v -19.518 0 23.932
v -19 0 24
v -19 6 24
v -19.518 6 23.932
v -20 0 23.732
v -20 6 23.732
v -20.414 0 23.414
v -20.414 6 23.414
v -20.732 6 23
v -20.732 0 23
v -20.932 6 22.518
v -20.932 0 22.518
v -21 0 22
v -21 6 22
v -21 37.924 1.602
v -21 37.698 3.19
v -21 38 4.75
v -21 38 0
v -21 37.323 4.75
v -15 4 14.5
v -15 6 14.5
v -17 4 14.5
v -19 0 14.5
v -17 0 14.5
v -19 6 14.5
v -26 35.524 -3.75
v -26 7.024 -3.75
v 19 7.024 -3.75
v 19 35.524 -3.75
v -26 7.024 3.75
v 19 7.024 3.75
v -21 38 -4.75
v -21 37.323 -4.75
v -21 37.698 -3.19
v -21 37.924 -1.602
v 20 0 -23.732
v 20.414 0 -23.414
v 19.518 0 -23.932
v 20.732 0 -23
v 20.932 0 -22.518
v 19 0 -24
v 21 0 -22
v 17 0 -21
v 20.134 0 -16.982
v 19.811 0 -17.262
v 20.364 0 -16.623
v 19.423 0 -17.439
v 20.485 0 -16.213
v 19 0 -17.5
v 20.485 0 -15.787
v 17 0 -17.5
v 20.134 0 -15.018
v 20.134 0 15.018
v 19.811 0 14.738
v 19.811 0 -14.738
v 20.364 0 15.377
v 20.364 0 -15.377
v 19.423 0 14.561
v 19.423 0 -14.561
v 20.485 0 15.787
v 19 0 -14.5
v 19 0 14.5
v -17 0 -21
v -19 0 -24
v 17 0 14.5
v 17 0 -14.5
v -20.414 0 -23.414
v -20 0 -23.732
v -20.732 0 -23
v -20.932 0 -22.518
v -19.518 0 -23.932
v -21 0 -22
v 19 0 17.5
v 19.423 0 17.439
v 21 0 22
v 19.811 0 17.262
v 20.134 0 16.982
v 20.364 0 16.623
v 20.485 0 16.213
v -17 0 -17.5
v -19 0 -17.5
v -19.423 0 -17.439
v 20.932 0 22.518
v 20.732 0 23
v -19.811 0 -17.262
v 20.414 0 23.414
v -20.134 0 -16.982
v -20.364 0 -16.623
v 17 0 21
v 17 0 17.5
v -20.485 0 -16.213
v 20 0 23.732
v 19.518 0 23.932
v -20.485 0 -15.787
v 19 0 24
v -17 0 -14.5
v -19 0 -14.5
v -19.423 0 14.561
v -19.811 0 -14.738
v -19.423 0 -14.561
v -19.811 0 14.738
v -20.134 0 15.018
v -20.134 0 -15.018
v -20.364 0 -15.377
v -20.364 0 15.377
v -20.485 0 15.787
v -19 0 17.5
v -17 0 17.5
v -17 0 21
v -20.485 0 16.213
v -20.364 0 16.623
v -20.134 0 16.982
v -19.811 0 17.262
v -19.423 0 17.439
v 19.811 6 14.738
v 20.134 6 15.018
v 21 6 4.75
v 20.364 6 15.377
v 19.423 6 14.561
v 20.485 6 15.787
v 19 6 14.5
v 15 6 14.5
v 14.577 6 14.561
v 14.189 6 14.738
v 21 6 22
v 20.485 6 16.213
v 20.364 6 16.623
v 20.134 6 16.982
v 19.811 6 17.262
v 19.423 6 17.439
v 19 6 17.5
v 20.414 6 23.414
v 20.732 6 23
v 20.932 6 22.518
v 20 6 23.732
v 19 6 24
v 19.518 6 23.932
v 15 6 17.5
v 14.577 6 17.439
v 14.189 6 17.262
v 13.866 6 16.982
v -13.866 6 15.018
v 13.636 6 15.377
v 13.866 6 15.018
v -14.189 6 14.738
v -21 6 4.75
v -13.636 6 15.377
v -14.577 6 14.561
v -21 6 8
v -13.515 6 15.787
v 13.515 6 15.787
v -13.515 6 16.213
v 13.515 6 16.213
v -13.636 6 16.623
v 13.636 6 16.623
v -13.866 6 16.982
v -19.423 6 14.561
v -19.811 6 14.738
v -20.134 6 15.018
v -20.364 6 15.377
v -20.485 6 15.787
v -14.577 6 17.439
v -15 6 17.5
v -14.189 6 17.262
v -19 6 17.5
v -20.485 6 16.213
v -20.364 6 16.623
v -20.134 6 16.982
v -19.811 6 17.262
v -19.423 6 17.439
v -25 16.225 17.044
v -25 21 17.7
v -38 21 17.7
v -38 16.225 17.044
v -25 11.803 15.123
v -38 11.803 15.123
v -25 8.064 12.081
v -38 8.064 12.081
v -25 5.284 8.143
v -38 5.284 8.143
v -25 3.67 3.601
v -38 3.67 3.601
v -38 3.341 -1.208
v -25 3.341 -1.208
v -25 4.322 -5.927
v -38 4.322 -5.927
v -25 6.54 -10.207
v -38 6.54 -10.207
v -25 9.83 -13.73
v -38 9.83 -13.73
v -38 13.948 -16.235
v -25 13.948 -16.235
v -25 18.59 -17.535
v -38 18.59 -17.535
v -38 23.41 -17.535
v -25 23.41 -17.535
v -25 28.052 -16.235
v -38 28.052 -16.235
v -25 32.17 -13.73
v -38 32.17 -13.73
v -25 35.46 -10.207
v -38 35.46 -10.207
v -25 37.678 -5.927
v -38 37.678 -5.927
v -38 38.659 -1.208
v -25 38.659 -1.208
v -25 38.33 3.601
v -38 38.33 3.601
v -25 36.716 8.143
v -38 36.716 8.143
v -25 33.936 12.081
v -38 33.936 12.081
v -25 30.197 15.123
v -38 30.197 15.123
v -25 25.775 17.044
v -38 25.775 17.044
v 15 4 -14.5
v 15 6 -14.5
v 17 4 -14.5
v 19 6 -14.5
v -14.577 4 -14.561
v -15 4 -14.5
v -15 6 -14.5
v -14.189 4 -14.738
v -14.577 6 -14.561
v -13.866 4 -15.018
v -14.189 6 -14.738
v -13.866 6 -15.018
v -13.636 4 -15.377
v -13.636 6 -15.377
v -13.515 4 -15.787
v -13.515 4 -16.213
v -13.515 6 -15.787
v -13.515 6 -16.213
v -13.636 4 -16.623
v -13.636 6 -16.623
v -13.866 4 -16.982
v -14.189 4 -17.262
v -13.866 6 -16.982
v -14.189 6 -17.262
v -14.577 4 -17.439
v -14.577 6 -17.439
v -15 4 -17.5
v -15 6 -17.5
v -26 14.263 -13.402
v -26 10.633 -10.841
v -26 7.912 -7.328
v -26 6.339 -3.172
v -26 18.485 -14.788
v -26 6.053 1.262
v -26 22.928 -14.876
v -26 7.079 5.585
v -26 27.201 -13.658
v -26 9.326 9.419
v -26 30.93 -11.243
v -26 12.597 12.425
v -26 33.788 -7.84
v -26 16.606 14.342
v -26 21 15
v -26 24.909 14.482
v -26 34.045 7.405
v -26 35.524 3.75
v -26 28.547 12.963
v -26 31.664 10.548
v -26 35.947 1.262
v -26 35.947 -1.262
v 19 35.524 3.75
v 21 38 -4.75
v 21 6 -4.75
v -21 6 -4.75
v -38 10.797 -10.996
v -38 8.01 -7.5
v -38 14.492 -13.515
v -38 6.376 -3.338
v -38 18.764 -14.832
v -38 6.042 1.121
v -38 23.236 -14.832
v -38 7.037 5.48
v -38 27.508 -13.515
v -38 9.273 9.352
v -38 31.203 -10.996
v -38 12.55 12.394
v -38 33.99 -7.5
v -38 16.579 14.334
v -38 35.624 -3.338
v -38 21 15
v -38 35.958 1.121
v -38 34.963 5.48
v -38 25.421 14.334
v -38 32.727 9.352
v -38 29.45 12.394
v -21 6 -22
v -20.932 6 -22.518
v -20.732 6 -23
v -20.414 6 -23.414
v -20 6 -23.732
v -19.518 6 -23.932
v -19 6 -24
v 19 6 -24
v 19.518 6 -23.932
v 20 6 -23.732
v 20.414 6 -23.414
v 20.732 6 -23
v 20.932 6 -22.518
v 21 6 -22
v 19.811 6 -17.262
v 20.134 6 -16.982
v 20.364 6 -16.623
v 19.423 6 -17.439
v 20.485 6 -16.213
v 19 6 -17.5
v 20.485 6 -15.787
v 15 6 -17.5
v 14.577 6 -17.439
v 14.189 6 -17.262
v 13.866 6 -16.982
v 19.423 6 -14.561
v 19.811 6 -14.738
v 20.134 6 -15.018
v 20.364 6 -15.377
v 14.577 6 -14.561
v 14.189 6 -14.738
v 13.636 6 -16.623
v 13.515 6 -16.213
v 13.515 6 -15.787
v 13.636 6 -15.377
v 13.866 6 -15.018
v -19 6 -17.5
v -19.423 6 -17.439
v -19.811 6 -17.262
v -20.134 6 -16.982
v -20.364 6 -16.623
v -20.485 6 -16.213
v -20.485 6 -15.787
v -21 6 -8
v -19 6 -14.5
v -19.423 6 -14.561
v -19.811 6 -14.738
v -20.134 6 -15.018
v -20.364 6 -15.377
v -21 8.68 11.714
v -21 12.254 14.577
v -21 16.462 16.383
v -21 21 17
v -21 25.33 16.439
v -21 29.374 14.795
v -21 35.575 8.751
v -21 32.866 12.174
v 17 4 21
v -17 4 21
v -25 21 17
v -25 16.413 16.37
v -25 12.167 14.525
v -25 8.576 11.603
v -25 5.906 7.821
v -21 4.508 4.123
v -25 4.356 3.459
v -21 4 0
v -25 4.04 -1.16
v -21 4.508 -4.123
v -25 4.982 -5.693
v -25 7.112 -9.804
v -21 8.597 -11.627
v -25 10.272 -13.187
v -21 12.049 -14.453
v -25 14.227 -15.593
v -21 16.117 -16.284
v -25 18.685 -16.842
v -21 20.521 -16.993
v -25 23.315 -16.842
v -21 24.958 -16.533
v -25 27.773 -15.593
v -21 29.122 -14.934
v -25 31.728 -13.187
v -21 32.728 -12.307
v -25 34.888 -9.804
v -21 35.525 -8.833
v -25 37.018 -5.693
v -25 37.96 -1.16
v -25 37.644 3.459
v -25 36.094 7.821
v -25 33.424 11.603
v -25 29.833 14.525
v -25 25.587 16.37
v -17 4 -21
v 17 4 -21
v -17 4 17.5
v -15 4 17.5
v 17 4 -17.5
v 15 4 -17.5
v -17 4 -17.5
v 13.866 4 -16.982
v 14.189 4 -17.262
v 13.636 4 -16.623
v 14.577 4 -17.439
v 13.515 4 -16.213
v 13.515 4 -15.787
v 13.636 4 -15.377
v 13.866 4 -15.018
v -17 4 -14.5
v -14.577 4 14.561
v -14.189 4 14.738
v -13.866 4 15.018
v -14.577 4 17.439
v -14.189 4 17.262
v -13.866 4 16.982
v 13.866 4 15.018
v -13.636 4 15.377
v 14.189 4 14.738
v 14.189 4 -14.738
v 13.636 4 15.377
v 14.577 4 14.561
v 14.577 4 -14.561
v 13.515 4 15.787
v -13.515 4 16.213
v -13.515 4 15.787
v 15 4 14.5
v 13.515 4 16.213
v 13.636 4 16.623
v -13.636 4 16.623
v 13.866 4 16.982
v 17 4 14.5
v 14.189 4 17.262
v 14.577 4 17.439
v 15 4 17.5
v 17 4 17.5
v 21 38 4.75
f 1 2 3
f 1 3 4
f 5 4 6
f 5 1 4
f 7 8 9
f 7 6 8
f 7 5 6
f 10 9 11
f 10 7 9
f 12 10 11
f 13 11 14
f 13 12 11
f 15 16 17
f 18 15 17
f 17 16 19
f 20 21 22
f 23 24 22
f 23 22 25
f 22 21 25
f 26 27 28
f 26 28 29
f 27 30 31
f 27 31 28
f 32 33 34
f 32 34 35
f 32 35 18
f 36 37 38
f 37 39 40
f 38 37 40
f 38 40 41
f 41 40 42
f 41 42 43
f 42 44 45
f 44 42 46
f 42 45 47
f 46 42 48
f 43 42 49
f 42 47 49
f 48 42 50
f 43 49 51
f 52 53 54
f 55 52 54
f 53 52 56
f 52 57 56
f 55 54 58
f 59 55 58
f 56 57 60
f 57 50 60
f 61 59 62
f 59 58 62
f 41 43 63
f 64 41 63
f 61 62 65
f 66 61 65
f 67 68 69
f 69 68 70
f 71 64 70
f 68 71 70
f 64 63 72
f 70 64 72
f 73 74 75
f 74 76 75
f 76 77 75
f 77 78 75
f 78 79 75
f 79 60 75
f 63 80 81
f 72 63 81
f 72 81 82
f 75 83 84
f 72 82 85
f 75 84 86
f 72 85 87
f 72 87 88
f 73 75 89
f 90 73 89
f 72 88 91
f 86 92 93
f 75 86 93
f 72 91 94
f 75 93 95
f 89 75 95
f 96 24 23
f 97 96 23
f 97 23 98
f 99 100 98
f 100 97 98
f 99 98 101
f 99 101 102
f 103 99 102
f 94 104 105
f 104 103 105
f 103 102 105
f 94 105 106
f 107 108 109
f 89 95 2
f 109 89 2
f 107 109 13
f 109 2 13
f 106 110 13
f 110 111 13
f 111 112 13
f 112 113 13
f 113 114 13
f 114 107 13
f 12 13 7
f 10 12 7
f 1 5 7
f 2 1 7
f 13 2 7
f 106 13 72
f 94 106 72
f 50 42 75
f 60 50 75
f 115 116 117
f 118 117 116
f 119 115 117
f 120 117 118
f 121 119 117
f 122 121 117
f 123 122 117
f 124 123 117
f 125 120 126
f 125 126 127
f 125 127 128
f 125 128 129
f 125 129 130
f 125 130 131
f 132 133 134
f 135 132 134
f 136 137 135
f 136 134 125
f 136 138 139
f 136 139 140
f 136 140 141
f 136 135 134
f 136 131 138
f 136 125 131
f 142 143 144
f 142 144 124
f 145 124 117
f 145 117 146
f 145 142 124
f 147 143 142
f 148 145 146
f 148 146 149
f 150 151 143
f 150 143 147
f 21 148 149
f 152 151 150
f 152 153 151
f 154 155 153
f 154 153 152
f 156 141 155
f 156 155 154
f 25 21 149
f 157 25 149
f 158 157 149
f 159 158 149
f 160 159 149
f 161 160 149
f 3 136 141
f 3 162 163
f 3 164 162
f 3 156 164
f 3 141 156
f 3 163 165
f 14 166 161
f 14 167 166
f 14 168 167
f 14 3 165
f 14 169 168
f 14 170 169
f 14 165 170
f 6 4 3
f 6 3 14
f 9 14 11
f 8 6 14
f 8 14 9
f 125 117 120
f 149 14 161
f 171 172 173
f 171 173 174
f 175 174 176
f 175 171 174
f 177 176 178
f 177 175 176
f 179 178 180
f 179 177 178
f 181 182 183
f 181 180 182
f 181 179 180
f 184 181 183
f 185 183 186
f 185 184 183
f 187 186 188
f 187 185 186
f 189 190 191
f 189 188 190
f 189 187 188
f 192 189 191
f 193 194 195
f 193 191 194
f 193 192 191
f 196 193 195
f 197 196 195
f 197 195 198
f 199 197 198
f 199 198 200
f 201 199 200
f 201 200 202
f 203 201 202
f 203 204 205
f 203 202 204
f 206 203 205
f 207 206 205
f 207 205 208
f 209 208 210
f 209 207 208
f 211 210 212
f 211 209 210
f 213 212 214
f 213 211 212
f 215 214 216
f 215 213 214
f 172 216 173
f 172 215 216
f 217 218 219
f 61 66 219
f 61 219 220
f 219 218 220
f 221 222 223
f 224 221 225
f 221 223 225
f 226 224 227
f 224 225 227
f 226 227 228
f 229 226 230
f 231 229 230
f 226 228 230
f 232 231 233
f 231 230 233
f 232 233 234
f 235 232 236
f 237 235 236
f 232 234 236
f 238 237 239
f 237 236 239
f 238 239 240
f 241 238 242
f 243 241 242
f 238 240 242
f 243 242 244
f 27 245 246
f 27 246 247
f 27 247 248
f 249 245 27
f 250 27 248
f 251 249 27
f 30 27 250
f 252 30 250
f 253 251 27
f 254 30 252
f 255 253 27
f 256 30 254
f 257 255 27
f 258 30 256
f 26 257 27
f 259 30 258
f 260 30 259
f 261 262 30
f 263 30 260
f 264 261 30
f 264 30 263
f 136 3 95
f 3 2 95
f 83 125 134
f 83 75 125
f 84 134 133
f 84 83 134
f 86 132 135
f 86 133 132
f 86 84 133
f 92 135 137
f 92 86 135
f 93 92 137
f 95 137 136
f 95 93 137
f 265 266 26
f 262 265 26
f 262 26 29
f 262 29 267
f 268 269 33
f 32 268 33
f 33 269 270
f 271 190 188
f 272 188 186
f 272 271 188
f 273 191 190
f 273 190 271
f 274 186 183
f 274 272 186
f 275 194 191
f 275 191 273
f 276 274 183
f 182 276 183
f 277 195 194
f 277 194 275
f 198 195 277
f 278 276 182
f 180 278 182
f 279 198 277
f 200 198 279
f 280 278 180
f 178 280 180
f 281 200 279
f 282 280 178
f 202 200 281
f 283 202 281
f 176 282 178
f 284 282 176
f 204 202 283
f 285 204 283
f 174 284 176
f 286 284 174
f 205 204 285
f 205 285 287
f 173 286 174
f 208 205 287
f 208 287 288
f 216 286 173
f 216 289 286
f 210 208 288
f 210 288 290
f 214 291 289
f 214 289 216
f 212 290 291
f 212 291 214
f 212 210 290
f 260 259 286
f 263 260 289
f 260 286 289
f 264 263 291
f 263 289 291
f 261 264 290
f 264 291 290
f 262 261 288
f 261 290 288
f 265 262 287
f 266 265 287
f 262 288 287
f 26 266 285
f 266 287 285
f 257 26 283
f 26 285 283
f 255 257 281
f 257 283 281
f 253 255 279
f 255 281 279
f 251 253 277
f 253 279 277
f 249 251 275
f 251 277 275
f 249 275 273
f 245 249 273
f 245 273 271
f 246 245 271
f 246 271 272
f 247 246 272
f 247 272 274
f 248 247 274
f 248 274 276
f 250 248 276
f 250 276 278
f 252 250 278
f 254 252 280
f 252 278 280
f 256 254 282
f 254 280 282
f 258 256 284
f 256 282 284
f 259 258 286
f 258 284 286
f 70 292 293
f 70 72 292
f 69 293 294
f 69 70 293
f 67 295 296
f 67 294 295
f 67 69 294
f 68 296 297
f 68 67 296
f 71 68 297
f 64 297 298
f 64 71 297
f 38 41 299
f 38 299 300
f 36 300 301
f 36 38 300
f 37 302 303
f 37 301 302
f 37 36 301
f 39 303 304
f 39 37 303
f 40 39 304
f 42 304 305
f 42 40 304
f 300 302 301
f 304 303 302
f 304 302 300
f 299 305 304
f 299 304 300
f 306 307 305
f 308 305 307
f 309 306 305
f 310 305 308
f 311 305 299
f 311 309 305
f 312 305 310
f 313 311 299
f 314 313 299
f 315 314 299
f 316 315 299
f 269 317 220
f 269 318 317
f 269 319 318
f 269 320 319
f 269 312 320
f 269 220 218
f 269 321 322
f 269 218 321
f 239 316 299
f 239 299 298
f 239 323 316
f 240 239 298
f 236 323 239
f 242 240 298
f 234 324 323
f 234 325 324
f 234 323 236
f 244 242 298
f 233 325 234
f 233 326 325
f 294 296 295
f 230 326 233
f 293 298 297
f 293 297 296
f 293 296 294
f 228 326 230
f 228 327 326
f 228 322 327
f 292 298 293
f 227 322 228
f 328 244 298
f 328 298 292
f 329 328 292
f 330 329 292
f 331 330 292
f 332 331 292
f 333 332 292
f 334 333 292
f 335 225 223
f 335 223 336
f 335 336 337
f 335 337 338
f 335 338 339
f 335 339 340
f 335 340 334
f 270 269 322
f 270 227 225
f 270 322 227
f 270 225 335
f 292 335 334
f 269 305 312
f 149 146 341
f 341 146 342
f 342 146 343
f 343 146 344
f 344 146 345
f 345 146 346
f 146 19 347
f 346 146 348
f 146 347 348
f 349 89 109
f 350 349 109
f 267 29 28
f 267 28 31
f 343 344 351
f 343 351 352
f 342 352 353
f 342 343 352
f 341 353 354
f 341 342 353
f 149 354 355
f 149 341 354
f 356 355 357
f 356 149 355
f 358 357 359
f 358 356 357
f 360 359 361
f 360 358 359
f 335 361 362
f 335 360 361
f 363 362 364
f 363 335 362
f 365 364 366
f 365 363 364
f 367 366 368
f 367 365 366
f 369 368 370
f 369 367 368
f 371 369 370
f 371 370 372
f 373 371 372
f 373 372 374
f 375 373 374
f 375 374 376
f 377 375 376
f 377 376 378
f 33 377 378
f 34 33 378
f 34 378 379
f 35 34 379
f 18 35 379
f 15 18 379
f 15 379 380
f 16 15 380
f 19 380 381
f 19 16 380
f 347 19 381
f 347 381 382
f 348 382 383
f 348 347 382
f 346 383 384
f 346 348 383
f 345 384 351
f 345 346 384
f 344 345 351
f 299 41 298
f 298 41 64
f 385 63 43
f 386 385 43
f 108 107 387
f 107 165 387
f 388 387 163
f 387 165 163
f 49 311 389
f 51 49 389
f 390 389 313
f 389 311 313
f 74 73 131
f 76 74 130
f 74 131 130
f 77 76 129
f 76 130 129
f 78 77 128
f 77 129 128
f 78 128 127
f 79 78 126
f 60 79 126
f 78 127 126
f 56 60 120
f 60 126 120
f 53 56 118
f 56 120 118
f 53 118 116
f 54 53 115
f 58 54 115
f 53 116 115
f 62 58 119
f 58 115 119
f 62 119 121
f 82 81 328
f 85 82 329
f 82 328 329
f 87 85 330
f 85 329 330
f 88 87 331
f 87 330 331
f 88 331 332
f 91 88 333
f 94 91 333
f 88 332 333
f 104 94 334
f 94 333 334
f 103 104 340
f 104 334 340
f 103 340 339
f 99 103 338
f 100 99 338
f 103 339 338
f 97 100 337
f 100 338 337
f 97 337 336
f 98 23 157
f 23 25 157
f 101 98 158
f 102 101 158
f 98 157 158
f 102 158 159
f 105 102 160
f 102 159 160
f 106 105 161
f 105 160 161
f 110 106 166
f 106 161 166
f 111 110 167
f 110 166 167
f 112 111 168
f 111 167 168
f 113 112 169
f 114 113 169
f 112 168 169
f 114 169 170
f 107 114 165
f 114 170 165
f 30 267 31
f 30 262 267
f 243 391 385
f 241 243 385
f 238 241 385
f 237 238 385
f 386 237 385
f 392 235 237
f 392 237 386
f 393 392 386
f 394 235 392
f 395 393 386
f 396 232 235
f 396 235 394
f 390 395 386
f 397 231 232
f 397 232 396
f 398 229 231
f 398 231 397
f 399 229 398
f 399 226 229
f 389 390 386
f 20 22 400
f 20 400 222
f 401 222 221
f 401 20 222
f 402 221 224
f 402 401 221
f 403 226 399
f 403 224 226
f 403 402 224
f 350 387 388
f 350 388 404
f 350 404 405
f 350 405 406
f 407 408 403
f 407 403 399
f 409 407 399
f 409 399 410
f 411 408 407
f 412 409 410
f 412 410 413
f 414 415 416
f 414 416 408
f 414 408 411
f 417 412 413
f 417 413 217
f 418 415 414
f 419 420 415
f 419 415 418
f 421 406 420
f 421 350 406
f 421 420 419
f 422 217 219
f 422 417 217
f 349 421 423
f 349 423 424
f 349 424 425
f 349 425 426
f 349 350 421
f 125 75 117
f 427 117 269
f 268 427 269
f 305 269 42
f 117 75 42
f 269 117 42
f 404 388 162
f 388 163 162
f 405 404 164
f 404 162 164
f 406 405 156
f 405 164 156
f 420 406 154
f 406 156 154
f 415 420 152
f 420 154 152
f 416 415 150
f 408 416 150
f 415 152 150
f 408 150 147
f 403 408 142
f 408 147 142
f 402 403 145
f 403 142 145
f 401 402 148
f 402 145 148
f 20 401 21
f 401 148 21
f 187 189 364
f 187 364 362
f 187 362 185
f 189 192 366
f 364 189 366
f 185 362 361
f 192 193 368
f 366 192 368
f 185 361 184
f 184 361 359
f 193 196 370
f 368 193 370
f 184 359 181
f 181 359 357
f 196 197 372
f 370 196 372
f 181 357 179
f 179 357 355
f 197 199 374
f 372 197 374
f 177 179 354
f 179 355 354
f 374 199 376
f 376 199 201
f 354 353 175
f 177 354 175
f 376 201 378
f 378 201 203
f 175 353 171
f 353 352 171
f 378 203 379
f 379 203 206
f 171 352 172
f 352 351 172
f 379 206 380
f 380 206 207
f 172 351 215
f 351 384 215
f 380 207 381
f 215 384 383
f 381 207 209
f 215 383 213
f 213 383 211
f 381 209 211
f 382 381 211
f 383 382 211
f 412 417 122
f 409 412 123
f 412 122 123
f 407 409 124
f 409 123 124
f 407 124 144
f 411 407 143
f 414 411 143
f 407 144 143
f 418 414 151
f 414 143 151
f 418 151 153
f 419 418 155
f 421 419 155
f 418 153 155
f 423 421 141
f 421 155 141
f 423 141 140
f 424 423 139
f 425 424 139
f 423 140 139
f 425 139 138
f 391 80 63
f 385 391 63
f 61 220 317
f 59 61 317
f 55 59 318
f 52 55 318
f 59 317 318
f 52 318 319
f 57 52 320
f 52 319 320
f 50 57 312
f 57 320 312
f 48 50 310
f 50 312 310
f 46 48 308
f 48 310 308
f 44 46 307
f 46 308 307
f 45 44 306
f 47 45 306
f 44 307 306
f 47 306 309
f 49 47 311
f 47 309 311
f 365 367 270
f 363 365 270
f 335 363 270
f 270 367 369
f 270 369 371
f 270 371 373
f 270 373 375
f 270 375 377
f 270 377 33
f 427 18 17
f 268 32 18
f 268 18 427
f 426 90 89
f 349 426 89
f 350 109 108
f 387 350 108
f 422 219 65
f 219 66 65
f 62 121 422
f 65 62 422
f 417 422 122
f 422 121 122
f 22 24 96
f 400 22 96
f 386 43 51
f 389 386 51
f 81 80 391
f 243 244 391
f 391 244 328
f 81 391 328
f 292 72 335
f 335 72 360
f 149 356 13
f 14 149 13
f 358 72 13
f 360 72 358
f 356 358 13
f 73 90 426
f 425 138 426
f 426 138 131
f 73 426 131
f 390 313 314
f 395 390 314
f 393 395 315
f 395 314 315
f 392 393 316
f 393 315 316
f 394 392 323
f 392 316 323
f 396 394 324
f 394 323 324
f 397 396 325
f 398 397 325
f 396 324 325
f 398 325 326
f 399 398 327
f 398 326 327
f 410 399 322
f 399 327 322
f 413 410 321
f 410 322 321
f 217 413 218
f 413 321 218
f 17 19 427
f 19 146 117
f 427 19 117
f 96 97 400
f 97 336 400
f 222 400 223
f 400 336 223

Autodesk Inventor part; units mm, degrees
ref_plane "YZ Plane" through (0, 0, 0) normal (1, 0, 0) x (0, 1, 0)
ref_plane "XZ Plane" through (0, 0, 0) normal (0, 1, 0) x (-1, 0, 0)
ref_plane "XY Plane" through (0, 0, 0) normal (0, 0, 1) x (1, 0, 0)
sketch "Sketch1" plane through (0, 0, 0) normal (0, 1, 0) x (-1, 0, 0)
  line L0 (29.9799, 0) -> (-29.9799, 0) projected
  line L1 (0, -34.1799) -> (0, 34.1799) projected
  line L2 (19, 24) -> (-19, 24)
  line L3 (-21, 22) -> (-21, -22)
  line L4 (-19, -24) -> (19, -24)
  line L5 (21, -22) -> (21, 22)
  arc A0 (21, 22) -> (19, 24) centre (19, 22) ccw
  arc A1 (19, -24) -> (21, -22) centre (19, -22) ccw
  arc A2 (-21, -22) -> (-19, -24) centre (-19, -22) ccw
  arc A3 (-19, 24) -> (-21, 22) centre (-19, 22) ccw
  point P0 (0, 0)
  point P1 (21, 24)
  point P2 (-21, -24)
  point P3 (-21, 24)
  point P4 (21, -24)
  dimension "d0" = 42
  dimension "d1" = 48
  dimension "d4" = 2
extrude "Extrusion1" add sketch "Sketch1" along normal blind 6
sketch "Sketch2" plane through (0, 0, 0) normal (0, -1, 0) x (1, 0, 0)
  line L0 (-29.4, 0) -> (29.4, 0) projected
  line L1 (0, -33.6) -> (0, 33.6) projected
  line L2 (17, 21) -> (-17, 21)
  line L3 (-17, 21) -> (-17, -21)
  line L4 (-17, -21) -> (17, -21)
  line L5 (17, -21) -> (17, 21)
  point P0 (0, 0)
  dimension "d5" = 34
  dimension "d6" = 42
extrude "Extrusion2" cut sketch "Sketch2" against normal blind 4
sketch "Sketch3" plane through (0, 6, 0) normal (0, 1, 0) x (1, 0, 0)
  line L0 (-29.4, 0) -> (29.4, 0) projected
  line L1 (0, 33.6) -> (0, -33.6) projected
  line L2 (19, 16) -> (15, 16) construction
  line L3 (17, -21) -> (17, 21) projected
  line L4 (19, 17.5) -> (15, 17.5)
  line L5 (15, 14.5) -> (19, 14.5)
  arc A0 (19, 14.5) -> (19, 17.5) centre (19, 16) ccw
  arc A1 (15, 17.5) -> (15, 14.5) centre (15, 16) ccw
  line L6 (19, 16) -> (23, 16) construction
  line L7 (21, -22) -> (21, 22) projected
  line L8 (19, 24) -> (-19, 24) projected
  point P0 (0, 0)
  point P1 (17, 16)
  dimension "d9" = 4
  dimension "d10" = 180
  dimension "d11" = 3
  dimension "d12" = 4
  dimension "d13" = 8
extrude "Extrusion3" cut sketch "Sketch3" against normal through all
mirror "Mirror1" about plane through (0, 0, 0) normal (0, 0, 1) of "Extrusion3"
mirror "Mirror2" about plane through (0, 0, 0) normal (1, 0, 0) of "Extrusion3", "Mirror1"
sketch "Sketch4" plane through (0, 6, 0) normal (0, 1, 0) x (1, 0, 0)
  line L0 (21, 4.75) -> (-21, 4.75)
  line L1 (-21, 4.75) -> (-21, -4.75)
  line L2 (-21, -4.75) -> (21, -4.75)
  line L3 (21, -4.75) -> (21, 4.75)
  line L4 (21, -22) -> (21, 22) projected
  line L5 (-21, 22) -> (-21, -22) projected
  line L6 (-29.4, 0) -> (29.4, 0) projected
  point P0 (0, 0)
  dimension "d16" = 9.5
extrude "Extrusion4" add sketch "Sketch4" along normal blind 32
sketch "Sketch5" plane through (-21, 0, -22) normal (-1, 0, 0) x (0, 0, 1)
  circle A0 centre (22, 21) radius 17
  line L0 (17.25, 38) -> (26.75, 38) projected
  line L1 (22, -7.6) -> (22, 45.6) projected
  point P0 (22, 0)
  dimension "d19" = 34
extrude "Extrusion5" add sketch "Sketch5" along normal blind 4
sketch "Sketch6" plane through (-25, 21, 0) normal (-1, 0, 0) x (0, 0, 1)
  circle A0 centre (0, 0) radius 17 projected
  circle A1 centre (0, 0) radius 17.7
  point P0 (0, -21)
  dimension "d22" = 35.4
extrude "Extrusion6" add sketch "Sketch6" along normal blind 13 contours A0 | A1
sketch "Sketch7" plane through (-38, 21, 0) normal (-1, 0, 0) x (0, 0, 1)
  circle A0 centre (0, 0) radius 17.7 projected
  circle A1 centre (0, 0) radius 15
  point P0 (0, -21)
  dimension "d25" = 30
extrude "Extrusion7" cut sketch "Sketch7" against normal blind 12 contours A1
sketch "Sketch8" plane through (-26, 21, 0) normal (-1, 0, 0) x (0, 0, 1)
  line L0 (-3.75, 14.5237) -> (3.75, 14.5237)
  line L1 (3.75, 14.5237) -> (3.75, -13.9763)
  line L2 (3.75, -13.9763) -> (-3.75, -13.9763)
  line L3 (-3.75, -13.9763) -> (-3.75, 14.5237)
  circle A0 centre (0, 0) radius 15 projected
  line L4 (0, -28.74) -> (0, 25.44) projected
  point P0 (0, -21)
  dimension "d28" = 7.5
  dimension "d29" = 28.5
extrude "Extrusion8" cut sketch "Sketch8" against normal blind 45 contours L0 L4 L2 L3 | L0 L1 L2 L4
properties part number "boquilla_capnografo_V1"
